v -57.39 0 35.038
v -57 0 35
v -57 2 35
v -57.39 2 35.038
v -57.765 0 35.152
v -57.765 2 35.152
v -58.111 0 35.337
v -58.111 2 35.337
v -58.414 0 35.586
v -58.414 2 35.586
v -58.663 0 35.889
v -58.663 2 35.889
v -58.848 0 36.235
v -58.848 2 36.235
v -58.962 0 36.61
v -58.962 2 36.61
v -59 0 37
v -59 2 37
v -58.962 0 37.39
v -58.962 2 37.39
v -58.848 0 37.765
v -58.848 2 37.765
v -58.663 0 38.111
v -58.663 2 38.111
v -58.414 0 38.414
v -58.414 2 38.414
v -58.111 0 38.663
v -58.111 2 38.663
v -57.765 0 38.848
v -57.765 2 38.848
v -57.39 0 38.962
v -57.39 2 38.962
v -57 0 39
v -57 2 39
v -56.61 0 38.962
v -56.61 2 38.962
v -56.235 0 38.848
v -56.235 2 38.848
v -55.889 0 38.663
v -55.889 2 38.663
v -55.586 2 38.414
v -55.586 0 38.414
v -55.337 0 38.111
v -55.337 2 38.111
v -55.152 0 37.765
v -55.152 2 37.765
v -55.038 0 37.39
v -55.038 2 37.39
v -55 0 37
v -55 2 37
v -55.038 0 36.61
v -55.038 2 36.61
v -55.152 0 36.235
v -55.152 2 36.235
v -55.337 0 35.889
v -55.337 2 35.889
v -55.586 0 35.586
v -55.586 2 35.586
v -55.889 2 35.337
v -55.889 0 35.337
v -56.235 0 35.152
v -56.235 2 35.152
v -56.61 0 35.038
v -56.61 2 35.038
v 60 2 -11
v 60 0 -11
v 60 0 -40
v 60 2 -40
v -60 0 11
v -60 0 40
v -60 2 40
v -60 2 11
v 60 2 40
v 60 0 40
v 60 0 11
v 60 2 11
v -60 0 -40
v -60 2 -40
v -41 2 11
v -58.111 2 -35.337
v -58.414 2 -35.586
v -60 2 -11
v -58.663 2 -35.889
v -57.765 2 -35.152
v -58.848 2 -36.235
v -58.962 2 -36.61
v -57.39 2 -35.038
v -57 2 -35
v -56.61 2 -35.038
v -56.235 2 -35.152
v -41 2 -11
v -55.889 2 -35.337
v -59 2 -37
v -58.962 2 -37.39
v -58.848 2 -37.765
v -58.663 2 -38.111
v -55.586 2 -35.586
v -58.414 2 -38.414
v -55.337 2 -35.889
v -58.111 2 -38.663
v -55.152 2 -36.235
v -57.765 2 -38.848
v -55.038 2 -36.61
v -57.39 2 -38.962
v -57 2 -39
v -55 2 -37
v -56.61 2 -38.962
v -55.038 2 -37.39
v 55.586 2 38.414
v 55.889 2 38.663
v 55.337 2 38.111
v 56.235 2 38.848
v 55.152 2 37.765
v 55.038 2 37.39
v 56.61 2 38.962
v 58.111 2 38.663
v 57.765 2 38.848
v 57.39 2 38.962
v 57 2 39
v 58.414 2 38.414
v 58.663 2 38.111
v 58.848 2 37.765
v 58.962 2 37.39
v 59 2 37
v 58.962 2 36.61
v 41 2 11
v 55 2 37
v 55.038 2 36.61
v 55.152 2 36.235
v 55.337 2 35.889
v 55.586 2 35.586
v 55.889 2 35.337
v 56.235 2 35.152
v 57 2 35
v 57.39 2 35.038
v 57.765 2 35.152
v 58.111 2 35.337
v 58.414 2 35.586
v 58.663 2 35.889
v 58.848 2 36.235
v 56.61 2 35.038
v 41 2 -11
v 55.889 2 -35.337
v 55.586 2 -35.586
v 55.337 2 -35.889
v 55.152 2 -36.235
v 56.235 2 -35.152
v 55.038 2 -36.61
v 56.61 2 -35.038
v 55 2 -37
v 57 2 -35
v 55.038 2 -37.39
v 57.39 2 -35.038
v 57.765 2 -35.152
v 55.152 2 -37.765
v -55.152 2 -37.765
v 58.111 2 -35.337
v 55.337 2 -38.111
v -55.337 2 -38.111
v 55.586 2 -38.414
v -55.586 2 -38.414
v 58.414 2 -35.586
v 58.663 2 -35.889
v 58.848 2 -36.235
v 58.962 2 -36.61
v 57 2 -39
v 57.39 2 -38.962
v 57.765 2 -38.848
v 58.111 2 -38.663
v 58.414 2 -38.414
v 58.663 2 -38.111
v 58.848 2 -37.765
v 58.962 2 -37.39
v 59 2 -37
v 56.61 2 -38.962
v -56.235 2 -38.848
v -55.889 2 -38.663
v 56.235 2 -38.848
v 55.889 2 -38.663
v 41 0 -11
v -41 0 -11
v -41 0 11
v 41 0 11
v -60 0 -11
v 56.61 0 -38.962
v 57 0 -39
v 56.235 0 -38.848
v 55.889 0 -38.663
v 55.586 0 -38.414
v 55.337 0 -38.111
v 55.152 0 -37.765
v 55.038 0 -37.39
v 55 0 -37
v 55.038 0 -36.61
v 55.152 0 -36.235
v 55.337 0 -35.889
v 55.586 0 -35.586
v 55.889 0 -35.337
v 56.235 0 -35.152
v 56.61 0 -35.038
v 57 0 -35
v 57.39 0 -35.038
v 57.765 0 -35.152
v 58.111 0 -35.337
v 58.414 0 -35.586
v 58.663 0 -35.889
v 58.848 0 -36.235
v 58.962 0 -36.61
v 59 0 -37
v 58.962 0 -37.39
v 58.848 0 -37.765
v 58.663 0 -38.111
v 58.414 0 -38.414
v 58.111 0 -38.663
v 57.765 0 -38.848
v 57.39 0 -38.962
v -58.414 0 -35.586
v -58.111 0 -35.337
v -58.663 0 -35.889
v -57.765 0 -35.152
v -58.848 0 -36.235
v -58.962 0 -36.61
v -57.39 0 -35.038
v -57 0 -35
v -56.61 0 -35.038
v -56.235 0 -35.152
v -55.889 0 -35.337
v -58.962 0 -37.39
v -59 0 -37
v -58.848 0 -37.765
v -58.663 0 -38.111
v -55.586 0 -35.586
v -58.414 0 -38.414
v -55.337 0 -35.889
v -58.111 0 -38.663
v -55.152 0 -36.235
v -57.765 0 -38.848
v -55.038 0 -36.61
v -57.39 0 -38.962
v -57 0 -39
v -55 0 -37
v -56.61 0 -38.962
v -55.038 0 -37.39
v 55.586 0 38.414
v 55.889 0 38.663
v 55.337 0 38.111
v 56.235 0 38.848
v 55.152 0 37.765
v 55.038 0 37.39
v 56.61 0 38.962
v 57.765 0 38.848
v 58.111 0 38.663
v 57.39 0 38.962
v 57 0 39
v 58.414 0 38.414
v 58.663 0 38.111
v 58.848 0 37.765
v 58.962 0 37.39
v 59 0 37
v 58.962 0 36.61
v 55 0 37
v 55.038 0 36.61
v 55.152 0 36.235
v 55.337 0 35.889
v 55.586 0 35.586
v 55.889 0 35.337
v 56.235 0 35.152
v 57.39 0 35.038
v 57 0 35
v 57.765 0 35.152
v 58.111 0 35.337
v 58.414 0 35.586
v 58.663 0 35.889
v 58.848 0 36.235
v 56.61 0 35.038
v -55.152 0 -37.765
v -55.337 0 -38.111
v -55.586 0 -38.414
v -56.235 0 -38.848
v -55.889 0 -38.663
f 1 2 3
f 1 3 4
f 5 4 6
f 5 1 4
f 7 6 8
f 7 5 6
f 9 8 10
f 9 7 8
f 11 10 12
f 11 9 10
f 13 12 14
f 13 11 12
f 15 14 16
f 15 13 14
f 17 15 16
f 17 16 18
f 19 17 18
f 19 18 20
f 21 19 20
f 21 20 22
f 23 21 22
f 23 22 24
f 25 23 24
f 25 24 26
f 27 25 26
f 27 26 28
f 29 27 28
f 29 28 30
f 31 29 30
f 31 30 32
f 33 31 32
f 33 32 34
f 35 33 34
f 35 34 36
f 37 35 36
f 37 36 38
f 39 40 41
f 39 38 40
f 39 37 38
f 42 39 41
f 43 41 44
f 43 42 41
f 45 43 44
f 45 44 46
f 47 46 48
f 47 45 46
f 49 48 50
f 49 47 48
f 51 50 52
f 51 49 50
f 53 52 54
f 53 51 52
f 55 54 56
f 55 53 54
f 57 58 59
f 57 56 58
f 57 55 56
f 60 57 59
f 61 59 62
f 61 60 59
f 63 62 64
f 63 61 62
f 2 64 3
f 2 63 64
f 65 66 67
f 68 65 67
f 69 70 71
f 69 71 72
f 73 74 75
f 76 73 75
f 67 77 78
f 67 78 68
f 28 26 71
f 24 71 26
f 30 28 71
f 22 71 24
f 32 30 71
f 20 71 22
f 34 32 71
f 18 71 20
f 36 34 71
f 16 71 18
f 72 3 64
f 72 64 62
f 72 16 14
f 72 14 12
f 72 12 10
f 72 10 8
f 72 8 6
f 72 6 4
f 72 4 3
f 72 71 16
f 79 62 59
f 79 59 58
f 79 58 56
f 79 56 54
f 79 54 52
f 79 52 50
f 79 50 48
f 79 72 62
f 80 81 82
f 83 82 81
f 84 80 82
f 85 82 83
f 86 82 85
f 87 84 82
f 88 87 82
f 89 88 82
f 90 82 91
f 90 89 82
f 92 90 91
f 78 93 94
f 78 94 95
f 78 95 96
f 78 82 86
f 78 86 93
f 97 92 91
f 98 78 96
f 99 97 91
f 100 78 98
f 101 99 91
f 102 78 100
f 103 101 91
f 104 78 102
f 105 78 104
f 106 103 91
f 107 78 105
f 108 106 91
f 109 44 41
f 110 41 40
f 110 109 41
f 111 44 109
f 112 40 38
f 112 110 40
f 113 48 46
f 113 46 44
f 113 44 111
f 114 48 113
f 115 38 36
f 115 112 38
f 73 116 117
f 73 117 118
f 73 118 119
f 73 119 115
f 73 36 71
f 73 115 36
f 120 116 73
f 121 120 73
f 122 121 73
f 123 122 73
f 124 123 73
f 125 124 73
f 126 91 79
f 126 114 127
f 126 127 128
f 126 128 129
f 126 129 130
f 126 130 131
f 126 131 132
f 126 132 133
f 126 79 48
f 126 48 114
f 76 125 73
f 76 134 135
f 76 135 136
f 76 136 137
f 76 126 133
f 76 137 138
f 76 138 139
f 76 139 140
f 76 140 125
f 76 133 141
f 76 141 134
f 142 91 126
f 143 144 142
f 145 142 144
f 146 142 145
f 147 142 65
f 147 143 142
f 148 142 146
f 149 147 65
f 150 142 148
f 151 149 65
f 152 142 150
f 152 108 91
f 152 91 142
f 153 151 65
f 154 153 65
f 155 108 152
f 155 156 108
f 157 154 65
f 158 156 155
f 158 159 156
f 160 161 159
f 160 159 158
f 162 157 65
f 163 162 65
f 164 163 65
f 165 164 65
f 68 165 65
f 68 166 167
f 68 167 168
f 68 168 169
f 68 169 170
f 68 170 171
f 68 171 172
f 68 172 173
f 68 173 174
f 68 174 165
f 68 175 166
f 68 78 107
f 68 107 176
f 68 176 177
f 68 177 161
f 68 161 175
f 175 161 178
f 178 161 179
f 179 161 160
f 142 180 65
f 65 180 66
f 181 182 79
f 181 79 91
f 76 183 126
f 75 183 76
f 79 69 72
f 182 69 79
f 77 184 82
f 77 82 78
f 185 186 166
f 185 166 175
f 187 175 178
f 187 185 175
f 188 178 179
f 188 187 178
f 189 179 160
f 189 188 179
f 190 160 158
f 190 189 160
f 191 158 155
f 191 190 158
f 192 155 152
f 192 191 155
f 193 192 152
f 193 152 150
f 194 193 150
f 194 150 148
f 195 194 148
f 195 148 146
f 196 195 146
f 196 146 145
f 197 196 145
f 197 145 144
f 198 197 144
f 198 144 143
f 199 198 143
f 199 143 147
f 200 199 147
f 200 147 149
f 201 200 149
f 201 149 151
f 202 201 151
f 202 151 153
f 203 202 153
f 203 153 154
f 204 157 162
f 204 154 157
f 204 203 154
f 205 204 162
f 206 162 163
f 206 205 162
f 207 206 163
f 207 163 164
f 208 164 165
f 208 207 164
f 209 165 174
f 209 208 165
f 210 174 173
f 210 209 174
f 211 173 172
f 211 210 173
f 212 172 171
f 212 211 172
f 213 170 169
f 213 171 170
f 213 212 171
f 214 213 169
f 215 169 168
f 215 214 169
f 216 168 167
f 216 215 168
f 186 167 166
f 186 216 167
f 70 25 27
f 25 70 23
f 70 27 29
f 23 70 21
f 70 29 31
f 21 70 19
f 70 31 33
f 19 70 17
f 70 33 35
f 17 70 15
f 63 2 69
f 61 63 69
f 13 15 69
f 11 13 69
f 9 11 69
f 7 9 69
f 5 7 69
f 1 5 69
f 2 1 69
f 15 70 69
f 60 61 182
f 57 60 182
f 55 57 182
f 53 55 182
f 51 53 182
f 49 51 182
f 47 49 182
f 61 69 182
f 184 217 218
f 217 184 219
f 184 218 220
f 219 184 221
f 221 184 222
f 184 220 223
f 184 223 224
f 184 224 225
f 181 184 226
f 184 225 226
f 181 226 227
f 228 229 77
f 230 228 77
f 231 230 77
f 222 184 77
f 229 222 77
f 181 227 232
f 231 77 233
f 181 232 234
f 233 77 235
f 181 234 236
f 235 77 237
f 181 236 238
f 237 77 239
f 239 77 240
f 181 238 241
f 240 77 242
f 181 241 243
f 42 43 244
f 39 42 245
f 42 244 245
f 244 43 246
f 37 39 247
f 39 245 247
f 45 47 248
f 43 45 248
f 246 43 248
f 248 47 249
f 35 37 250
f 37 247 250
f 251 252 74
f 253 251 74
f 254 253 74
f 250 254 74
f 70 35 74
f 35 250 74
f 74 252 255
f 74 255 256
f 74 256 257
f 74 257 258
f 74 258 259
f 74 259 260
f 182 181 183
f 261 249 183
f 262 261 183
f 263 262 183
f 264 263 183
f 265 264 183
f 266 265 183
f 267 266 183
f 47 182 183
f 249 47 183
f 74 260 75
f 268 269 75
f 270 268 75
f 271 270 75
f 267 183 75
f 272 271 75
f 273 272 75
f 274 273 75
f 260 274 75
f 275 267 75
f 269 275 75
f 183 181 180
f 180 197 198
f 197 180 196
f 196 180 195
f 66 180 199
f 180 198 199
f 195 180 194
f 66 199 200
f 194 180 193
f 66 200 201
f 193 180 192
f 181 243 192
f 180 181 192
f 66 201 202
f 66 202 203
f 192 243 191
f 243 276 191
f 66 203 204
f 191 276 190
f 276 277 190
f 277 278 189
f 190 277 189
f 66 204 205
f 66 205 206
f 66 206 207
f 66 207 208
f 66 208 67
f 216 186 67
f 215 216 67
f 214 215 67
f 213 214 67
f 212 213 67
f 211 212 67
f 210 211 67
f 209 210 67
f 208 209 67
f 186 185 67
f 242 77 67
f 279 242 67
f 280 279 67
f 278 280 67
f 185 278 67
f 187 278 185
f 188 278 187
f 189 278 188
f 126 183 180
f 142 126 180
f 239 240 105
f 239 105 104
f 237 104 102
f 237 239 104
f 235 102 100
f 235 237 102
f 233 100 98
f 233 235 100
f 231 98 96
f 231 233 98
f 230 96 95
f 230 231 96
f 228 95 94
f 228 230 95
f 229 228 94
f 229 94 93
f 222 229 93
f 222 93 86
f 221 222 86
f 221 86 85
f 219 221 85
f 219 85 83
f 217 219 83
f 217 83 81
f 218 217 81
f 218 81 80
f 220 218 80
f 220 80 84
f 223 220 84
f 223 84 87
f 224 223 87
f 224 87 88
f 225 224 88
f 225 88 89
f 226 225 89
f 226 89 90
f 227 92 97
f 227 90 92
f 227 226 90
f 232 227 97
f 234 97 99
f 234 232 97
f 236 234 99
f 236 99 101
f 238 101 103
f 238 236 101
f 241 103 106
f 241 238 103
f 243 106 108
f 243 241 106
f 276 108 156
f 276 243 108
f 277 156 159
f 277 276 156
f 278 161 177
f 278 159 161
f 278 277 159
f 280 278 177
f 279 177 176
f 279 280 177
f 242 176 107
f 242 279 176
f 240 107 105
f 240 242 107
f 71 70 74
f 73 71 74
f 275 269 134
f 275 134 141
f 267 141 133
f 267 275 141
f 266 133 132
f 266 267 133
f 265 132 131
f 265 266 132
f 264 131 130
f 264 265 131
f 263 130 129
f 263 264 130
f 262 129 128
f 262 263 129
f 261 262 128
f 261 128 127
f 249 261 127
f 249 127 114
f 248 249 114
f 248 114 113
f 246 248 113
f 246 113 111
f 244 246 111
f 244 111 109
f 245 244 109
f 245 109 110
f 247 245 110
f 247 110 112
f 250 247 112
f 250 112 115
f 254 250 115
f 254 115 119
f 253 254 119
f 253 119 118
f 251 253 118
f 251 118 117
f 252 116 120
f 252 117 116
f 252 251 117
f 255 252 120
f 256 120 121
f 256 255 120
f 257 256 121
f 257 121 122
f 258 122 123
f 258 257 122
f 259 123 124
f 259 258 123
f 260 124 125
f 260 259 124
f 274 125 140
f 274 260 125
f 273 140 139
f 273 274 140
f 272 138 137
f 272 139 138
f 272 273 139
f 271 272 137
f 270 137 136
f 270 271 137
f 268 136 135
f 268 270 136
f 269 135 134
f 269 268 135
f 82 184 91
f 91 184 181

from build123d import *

# Parameters (mm, degrees)
SKETCH1_W               = 120
SKETCH1_H               = 80
BOSS_EXTRUDE1_DEPTH     = 2
CUT_EXTRUDE1_DEPTH      = 20
CUT_EXTRUDE1_DEPTH_BACK = 20
SKETCH2_W               = 19
SKETCH2_H               = 22
CUT_EXTRUDE2_DEPTH      = 20
CUT_EXTRUDE2_DEPTH_BACK = 20
SKETCH3_W               = 19
SKETCH3_H               = 22
CUT_EXTRUDE3_DEPTH      = 20
CUT_EXTRUDE3_DEPTH_BACK = 20
SKETCH4_R               = 2


with BuildPart() as part:
    # Sketch1 → Boss-Extrude1 (new body)
    with BuildSketch(Plane(origin=(0, 0, 0), x_dir=(1, 0, 0), z_dir=(0, 1, 0))):
        Rectangle(SKETCH1_W, SKETCH1_H)
    extrude(amount=BOSS_EXTRUDE1_DEPTH)

    # Sketch2 → Cut-Extrude1 (cut, two sides: drawn at the far end of the back side and taken through both)
    with BuildSketch(Plane(origin=(0, 2, 0), x_dir=(1, 0, 0), z_dir=(0, 1, 0)).offset(-CUT_EXTRUDE1_DEPTH_BACK)):
        with Locations((-50.5, 0)):
            Rectangle(SKETCH2_W, SKETCH2_H)
    extrude(amount=CUT_EXTRUDE1_DEPTH + CUT_EXTRUDE1_DEPTH_BACK, mode=Mode.SUBTRACT)

    # Sketch3 → Cut-Extrude2 (cut, two sides: drawn at the far end of the back side and taken through both)
    with BuildSketch(Plane(origin=(0, 2, 0), x_dir=(1, 0, 0), z_dir=(0, 1, 0)).offset(-CUT_EXTRUDE2_DEPTH_BACK)):
        with Locations((50.5, 0)):
            Rectangle(SKETCH3_W, SKETCH3_H)
    extrude(amount=CUT_EXTRUDE2_DEPTH + CUT_EXTRUDE2_DEPTH_BACK, mode=Mode.SUBTRACT)

    # Sketch4 → Cut-Extrude3 (cut, two sides: drawn at the far end of the back side and taken through both)
    with BuildSketch(Plane(origin=(0, 2, 0), x_dir=(1, 0, 0), z_dir=(0, 1, 0)).offset(-CUT_EXTRUDE3_DEPTH_BACK)):
        with Locations((-57, 37)):
            Circle(SKETCH4_R)
        with Locations((57, 37)):
            Circle(SKETCH4_R)
        with Locations((57, -37)):
            Circle(SKETCH4_R)
        with Locations((-57, -37)):
            Circle(SKETCH4_R)
    extrude(amount=CUT_EXTRUDE3_DEPTH + CUT_EXTRUDE3_DEPTH_BACK, mode=Mode.SUBTRACT)


solid = part.part
